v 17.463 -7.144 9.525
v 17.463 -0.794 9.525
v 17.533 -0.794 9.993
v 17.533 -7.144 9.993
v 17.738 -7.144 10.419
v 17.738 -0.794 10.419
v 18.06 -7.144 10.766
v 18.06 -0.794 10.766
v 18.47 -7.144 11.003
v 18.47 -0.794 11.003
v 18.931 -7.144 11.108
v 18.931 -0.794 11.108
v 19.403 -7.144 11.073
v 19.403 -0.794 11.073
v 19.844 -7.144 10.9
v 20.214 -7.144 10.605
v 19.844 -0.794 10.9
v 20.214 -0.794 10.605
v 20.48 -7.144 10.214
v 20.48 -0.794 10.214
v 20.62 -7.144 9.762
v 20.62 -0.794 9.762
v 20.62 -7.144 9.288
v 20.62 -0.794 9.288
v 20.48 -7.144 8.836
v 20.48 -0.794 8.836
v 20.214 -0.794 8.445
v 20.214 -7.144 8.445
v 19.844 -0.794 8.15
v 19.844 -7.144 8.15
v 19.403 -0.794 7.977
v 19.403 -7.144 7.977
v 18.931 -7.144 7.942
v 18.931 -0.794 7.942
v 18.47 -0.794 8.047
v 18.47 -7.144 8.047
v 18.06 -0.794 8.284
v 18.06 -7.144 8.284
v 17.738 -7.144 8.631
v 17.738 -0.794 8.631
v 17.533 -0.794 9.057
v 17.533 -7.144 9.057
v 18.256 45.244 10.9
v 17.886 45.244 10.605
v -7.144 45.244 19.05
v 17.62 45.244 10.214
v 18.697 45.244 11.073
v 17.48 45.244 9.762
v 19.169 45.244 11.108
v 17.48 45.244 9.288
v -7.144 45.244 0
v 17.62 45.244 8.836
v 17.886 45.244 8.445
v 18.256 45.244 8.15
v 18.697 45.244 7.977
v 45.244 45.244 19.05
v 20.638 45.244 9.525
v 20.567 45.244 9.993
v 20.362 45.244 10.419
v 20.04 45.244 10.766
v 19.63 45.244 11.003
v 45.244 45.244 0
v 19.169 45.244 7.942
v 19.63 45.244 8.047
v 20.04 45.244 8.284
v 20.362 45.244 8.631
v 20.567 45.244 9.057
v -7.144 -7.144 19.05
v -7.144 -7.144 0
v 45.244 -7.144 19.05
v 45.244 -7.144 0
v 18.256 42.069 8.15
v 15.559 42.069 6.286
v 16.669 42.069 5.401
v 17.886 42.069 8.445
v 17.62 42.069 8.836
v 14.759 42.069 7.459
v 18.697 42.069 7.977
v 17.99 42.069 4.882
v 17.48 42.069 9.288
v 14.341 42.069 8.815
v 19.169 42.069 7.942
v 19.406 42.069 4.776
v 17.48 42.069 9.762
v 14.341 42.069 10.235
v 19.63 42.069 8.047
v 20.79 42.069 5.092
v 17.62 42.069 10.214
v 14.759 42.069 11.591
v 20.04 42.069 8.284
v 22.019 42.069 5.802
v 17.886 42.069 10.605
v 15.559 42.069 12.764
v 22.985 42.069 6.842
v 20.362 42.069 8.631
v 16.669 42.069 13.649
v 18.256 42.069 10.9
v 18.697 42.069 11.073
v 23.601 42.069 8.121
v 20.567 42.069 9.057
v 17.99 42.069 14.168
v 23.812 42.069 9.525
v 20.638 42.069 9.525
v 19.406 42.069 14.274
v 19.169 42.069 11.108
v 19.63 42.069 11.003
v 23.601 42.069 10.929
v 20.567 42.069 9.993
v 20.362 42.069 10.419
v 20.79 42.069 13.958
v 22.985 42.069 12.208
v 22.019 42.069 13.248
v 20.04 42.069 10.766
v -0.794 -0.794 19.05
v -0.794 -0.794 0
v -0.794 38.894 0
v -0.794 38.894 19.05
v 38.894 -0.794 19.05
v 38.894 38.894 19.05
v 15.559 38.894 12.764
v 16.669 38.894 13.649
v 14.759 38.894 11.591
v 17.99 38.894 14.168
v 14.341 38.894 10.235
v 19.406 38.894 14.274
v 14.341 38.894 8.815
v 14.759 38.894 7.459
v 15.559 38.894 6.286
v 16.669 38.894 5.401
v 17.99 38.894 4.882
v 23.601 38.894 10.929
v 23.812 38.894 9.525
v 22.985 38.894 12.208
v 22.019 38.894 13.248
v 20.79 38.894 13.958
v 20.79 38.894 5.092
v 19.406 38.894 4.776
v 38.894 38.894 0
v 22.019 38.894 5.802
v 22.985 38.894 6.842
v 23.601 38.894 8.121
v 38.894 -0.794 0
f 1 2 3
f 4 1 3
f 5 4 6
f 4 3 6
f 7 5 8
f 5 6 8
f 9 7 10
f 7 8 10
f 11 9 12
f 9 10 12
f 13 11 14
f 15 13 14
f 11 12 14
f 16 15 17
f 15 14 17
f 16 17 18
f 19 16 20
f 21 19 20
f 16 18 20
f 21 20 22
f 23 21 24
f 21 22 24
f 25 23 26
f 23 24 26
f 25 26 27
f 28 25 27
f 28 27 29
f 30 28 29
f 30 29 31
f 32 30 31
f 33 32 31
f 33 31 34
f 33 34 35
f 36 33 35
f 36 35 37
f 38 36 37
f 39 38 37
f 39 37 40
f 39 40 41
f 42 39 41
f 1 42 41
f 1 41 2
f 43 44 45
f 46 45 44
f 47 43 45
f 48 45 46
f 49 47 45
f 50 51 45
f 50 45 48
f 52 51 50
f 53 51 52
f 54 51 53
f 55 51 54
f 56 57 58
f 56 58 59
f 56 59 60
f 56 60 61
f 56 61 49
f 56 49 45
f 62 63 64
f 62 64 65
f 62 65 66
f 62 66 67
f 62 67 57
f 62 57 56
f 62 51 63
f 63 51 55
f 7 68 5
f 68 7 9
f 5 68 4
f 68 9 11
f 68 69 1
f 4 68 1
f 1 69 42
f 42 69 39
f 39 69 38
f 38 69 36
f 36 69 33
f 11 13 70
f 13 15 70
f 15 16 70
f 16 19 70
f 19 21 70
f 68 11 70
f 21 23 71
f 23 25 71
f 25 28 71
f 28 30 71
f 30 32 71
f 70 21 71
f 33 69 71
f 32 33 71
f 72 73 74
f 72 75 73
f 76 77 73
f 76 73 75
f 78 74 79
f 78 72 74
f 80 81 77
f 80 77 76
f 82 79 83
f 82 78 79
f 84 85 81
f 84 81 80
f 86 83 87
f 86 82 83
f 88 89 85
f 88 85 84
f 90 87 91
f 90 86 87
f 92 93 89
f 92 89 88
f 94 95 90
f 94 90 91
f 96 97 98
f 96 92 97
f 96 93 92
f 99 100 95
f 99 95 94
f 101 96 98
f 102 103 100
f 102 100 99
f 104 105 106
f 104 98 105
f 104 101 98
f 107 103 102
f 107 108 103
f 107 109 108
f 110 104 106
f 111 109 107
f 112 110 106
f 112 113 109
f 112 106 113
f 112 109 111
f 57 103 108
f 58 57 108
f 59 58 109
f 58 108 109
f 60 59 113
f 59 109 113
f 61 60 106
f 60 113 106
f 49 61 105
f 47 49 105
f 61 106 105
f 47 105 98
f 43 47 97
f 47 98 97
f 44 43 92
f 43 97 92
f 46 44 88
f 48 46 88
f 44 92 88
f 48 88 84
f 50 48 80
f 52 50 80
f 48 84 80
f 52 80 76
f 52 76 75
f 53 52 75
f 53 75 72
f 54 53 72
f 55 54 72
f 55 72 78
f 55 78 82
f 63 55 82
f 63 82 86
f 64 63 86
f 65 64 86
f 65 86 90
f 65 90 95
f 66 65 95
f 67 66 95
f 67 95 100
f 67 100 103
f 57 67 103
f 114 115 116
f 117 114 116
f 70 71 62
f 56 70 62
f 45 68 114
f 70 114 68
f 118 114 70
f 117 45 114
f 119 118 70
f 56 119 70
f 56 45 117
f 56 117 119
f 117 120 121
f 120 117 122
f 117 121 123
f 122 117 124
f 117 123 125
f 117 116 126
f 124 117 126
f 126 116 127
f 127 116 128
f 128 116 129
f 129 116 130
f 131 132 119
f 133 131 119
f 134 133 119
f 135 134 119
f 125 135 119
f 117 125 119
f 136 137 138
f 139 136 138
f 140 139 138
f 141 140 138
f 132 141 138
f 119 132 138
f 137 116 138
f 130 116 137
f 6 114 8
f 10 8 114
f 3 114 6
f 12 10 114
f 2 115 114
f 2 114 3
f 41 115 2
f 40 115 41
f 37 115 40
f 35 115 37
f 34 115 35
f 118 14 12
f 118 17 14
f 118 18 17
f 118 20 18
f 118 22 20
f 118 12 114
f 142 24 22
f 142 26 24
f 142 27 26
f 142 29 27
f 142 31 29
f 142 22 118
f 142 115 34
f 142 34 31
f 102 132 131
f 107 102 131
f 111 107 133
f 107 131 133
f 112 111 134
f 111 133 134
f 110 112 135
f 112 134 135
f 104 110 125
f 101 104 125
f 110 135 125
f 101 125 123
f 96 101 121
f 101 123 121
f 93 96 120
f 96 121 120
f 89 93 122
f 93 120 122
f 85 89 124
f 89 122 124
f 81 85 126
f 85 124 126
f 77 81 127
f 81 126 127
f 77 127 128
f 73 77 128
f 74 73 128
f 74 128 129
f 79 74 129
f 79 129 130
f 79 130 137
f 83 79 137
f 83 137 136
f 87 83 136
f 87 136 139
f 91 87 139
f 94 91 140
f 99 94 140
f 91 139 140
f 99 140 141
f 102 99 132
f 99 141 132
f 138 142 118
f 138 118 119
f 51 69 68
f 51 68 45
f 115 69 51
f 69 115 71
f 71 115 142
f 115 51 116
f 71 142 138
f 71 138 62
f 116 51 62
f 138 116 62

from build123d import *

# Parameters (mm, degrees)
F0_W     = 52.3875
F0_H     = 52.3875
F0_W_2   = 39.6875
F0_H_2   = 39.6875
F1_DEPTH = 19.05
F2_R     = 1.5875
F3_DEPTH = 25.4
F2_R_2   = 4.7625
F4_DEPTH = 3.175
F6_D     = 3.175


with BuildPart() as f1:
    # F0 (on Top) → F1 (new body)
    with BuildSketch(Plane.XY):
        with Locations((19.05, 19.05)):
            Rectangle(F0_W, F0_H)
        with Locations((19.05, 19.05)):
            Rectangle(F0_W_2, F0_H_2, mode=Mode.SUBTRACT)
    extrude(amount=F1_DEPTH)

    # F2 (on face) → F3 (cut)
    with BuildSketch(Plane.XZ.offset(-38.89375)):
        with Locations((19.05, 9.525)):
            Circle(F2_R)
    extrude(amount=-F3_DEPTH, mode=Mode.SUBTRACT)

    # F2 (on face) → F4 (cut)
    with BuildSketch(Plane.XZ.offset(-38.89375)):
        with Locations((19.05, 9.525)):
            Circle(F2_R_2)
        with Locations((19.05, 9.525)):
            Circle(F2_R, mode=Mode.SUBTRACT)
    extrude(amount=-F4_DEPTH, mode=Mode.SUBTRACT)

    # F6 (through all)
    with Locations(Plane.XZ.offset(7.14375)):
        with Locations((19.05, 9.525)):
            Hole(F6_D / 2)


solid = f1.part
